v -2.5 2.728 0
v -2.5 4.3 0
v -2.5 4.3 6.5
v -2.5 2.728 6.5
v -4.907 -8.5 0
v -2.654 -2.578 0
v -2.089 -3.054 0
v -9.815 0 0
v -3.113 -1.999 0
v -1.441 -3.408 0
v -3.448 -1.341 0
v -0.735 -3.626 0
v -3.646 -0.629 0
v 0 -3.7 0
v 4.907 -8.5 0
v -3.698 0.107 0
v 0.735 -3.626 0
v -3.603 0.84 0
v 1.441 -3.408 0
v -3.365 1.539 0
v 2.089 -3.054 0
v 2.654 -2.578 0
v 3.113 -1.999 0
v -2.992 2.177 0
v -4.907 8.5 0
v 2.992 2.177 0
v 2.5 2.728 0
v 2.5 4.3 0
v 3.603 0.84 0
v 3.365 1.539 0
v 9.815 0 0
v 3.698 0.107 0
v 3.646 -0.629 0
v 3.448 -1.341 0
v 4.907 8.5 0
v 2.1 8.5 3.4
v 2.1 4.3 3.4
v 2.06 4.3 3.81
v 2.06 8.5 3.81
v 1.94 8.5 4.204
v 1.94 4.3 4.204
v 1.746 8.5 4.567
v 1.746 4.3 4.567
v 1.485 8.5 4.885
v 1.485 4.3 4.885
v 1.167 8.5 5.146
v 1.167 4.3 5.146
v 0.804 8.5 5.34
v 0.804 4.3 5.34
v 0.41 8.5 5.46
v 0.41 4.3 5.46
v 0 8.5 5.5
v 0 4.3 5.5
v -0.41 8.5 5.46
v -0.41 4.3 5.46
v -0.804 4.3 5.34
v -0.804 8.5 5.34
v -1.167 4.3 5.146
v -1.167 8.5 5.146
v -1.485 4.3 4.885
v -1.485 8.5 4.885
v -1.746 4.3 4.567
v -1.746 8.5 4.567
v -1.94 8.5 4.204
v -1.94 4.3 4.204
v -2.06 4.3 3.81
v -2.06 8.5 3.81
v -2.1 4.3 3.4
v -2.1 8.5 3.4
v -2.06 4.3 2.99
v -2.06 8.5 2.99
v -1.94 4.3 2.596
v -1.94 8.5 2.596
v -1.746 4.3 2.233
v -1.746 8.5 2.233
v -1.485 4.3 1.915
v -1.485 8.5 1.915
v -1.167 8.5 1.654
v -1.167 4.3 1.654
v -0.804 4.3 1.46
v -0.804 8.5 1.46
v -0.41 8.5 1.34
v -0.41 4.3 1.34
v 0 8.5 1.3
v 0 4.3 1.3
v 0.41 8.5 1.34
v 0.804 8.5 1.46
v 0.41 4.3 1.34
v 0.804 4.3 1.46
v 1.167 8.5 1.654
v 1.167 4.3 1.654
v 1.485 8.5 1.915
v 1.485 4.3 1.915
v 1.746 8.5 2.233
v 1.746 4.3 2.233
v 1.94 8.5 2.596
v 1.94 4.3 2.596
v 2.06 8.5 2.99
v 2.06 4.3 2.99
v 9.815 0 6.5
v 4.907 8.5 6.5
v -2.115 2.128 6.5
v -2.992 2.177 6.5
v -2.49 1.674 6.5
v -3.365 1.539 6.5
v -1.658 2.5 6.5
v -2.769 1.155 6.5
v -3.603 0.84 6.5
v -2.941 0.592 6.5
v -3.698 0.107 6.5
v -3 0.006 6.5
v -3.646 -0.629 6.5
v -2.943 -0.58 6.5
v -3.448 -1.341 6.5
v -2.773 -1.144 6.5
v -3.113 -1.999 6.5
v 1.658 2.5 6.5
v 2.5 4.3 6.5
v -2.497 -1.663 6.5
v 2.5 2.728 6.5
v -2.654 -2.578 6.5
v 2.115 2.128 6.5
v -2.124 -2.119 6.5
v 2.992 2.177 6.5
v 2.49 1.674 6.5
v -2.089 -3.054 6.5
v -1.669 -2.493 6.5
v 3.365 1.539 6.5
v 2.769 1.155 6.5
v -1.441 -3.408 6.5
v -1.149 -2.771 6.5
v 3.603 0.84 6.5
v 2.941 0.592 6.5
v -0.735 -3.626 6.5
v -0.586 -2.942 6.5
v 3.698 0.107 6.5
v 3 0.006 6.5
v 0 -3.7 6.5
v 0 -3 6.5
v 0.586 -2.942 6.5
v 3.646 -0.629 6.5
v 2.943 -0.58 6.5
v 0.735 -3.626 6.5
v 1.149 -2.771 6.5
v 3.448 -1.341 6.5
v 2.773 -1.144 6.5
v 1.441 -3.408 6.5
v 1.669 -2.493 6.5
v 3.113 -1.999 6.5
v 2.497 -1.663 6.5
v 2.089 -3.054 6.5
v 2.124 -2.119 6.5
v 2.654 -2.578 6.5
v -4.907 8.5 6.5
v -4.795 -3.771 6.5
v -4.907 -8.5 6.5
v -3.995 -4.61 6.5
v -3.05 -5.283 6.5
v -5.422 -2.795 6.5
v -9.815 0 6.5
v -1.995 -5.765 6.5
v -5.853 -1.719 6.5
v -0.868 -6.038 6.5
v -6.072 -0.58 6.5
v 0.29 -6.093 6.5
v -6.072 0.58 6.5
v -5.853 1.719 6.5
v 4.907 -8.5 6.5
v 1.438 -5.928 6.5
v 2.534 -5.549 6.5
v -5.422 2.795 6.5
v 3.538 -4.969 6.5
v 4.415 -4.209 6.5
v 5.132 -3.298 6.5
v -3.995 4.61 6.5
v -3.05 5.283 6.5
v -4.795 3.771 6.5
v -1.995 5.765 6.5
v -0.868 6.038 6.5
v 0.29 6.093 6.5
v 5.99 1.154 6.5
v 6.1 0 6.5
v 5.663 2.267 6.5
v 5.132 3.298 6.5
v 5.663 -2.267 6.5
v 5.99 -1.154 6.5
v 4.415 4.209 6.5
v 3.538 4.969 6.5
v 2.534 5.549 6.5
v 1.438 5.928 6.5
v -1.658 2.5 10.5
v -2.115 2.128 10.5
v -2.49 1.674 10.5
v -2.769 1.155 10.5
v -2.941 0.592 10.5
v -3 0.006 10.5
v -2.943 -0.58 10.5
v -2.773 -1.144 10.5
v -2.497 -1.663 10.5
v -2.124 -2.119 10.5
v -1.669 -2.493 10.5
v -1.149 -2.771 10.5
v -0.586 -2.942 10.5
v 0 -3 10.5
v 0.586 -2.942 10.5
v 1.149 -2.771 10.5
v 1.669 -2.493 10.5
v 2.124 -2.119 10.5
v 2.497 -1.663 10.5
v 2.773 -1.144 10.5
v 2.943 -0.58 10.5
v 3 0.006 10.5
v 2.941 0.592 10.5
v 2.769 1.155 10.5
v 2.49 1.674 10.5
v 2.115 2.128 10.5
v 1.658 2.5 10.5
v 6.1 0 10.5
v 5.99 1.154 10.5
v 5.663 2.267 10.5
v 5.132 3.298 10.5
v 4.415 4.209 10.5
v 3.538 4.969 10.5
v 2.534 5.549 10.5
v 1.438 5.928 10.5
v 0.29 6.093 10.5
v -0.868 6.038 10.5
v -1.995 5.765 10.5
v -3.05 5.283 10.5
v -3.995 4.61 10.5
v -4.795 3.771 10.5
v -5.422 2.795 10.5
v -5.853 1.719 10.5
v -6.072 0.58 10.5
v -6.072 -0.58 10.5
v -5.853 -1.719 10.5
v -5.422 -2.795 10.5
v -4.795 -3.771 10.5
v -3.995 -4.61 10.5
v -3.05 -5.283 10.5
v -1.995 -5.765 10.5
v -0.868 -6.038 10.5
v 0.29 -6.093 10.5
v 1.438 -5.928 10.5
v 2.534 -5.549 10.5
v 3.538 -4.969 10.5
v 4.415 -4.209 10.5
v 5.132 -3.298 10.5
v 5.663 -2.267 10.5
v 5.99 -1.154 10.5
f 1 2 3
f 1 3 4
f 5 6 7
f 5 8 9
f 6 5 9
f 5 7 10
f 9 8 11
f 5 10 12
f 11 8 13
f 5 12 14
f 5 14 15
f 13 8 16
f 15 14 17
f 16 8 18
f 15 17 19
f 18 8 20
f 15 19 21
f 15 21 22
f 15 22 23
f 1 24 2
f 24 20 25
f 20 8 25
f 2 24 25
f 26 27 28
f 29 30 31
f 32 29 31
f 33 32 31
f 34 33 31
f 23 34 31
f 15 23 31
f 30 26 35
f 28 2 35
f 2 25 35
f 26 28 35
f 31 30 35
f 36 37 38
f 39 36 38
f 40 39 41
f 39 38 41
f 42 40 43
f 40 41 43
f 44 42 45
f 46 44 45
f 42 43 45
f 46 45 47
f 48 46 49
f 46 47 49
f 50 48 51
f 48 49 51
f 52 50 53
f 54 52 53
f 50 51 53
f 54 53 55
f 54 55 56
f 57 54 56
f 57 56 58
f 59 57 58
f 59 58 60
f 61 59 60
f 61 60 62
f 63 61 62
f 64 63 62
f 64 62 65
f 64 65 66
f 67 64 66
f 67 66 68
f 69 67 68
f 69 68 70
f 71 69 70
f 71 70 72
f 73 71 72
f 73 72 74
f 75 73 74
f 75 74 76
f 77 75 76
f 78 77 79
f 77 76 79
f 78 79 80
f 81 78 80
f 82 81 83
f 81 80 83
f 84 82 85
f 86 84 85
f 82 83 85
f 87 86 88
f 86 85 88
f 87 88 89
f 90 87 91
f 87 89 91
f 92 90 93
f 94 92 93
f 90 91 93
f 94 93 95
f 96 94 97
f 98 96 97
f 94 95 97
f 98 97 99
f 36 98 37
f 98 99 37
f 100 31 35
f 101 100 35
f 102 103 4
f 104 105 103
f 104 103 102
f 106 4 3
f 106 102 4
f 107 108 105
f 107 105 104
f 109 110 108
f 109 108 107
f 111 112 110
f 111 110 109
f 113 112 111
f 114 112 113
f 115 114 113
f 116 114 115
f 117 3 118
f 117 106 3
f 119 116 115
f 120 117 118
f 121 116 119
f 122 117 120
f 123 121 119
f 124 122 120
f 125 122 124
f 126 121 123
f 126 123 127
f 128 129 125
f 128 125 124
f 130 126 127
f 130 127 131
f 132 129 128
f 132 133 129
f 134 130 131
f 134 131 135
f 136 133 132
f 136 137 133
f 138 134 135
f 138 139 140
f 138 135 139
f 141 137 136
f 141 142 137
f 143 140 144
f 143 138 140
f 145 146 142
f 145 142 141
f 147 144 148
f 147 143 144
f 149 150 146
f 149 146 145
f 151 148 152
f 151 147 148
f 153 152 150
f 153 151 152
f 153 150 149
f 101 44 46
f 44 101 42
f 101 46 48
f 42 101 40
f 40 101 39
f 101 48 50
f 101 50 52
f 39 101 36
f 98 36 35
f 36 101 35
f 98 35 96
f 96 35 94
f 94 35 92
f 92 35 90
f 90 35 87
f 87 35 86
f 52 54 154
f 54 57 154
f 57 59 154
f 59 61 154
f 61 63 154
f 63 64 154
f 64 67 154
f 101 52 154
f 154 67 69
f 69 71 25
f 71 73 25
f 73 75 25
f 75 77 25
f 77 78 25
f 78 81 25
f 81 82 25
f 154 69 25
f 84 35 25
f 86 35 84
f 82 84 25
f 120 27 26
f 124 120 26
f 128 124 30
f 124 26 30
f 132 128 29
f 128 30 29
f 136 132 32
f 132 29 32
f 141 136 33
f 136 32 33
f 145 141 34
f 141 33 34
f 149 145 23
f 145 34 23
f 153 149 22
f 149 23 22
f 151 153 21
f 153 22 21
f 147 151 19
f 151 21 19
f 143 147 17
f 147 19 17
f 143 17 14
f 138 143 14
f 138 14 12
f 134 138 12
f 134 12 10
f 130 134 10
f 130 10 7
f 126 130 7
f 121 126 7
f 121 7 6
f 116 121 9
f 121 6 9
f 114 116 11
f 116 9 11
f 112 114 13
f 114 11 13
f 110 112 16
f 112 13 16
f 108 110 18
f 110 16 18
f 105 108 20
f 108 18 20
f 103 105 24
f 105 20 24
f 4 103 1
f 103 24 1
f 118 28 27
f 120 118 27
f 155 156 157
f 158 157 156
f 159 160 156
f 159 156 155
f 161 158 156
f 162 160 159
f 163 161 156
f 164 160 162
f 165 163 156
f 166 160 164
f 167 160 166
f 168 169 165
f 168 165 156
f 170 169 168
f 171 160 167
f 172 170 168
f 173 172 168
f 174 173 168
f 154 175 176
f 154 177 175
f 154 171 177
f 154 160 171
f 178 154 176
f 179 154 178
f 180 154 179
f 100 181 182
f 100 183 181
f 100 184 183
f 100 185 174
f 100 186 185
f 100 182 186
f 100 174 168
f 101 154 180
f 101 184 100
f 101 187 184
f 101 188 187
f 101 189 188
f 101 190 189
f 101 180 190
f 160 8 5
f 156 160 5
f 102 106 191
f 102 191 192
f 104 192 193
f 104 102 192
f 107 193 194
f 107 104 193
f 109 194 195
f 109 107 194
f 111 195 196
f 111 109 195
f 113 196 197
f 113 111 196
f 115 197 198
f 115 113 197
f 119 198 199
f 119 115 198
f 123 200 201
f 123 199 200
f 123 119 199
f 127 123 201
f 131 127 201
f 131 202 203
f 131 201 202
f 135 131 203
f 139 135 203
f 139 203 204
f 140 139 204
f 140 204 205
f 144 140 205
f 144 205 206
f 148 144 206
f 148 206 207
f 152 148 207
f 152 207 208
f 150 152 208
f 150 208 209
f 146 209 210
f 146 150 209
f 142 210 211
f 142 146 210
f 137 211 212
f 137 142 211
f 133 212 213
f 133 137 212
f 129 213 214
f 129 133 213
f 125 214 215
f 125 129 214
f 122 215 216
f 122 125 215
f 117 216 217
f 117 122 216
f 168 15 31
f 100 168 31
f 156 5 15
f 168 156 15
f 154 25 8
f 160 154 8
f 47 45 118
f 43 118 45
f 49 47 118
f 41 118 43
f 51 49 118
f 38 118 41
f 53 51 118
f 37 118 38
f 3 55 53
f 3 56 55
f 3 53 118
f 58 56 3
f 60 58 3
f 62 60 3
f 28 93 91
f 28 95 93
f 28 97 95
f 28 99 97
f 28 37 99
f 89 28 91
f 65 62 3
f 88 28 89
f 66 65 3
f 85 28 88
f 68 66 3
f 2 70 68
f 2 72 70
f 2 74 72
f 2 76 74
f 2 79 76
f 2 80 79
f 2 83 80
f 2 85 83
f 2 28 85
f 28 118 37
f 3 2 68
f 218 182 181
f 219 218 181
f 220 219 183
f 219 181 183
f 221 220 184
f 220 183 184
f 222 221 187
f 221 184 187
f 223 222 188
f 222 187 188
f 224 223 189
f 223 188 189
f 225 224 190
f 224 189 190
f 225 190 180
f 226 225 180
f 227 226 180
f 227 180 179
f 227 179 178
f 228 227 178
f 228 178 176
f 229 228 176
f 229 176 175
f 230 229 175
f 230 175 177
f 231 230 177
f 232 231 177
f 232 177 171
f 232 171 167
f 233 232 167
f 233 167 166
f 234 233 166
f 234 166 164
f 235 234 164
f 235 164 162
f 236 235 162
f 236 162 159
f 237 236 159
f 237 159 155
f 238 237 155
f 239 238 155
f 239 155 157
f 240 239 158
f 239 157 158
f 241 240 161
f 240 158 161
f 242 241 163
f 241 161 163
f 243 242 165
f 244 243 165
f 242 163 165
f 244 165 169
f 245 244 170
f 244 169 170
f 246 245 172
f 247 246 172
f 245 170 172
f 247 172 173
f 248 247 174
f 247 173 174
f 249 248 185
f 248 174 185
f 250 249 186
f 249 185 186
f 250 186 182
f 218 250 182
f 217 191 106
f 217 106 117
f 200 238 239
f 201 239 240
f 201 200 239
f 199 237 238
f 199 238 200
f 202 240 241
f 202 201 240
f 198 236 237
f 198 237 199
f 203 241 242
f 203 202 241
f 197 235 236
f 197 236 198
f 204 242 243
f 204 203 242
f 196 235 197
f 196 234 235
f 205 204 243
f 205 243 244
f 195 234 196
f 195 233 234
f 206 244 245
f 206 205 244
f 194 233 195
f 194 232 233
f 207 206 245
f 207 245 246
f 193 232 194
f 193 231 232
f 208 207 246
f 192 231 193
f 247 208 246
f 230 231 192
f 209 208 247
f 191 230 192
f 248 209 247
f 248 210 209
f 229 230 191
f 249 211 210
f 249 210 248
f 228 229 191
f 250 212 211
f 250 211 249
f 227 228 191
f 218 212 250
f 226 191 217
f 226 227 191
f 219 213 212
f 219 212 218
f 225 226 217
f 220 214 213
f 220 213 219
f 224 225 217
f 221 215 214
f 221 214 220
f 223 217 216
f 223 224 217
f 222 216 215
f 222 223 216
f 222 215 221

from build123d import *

# Parameters (mm, degrees)
SKETCH_R        = 3
PAD_DEPTH       = 6.5
SKETCH001_R     = 6.1
SKETCH001_R_2   = 3
PAD001_DEPTH    = 10
PAD002_DEPTH    = 13
SKETCH003_R     = 6.1
POCKET_DEPTH    = 6
POCKET001_DEPTH = 6.5
SKETCH005_R     = 2.1
POCKET002_DEPTH = 4.201


with BuildPart() as part:
    # Sketch → Pad (new body)
    with BuildSketch(Plane.XY):
        Polygon((9.814955, 0), (4.907477, 8.5), (-4.907477, 8.5), (-9.814955, 0), (-4.907477, -8.5), (4.907477, -8.5), align=None)
        Circle(SKETCH_R, mode=Mode.SUBTRACT)
    extrude(amount=PAD_DEPTH)

    # Sketch001 (on Face9 of Pad) → Pad001 (join)
    with BuildSketch(Plane.XY.offset(6.5)):
        Circle(SKETCH001_R)
        Circle(SKETCH001_R_2, mode=Mode.SUBTRACT)
    extrude(amount=PAD001_DEPTH)

    # Sketch002 (on Face12 of Pad001) → Pad002 (join)
    with BuildSketch(Plane.XY.offset(16.5)):
        with BuildLine():
            Line((-1.658312, 2.5), (1.658312, 2.5))
            ThreePointArc((1.658312, 2.5), (0, 3), (-1.658312, 2.5))
        make_face()
    extrude(amount=-PAD002_DEPTH)

    # Sketch003 (on Face15 of Pad002) → Pocket (cut)
    with BuildSketch(Plane.XY.offset(16.5)):
        Circle(SKETCH003_R)
    extrude(amount=-POCKET_DEPTH, mode=Mode.SUBTRACT)

    # Sketch004 (on Face4 of Pocket) → Pocket001 (cut)
    with BuildSketch(Plane(origin=(0, 0, 0), x_dir=(1, 0, 0), z_dir=(0, 0, -1))):
        with BuildLine():
            ThreePointArc((2.5, -2.727636), (0, 3.7), (-2.5, -2.727636))
            Line((-2.5, -4.3), (-2.5, -2.727636))
            Line((2.5, -4.3), (-2.5, -4.3))
            Line((2.5, -4.3), (2.5, -2.727636))
        make_face()
    extrude(amount=-POCKET001_DEPTH, mode=Mode.SUBTRACT)

    # Sketch005 (on Face9 of Pocket001) → Pocket002 (cut, through all)
    with BuildSketch(Plane.XZ.offset(-4.3)):
        with Locations((0, 3.4)):
            Circle(SKETCH005_R)
    extrude(amount=-POCKET002_DEPTH, mode=Mode.SUBTRACT)


solid = part.part
